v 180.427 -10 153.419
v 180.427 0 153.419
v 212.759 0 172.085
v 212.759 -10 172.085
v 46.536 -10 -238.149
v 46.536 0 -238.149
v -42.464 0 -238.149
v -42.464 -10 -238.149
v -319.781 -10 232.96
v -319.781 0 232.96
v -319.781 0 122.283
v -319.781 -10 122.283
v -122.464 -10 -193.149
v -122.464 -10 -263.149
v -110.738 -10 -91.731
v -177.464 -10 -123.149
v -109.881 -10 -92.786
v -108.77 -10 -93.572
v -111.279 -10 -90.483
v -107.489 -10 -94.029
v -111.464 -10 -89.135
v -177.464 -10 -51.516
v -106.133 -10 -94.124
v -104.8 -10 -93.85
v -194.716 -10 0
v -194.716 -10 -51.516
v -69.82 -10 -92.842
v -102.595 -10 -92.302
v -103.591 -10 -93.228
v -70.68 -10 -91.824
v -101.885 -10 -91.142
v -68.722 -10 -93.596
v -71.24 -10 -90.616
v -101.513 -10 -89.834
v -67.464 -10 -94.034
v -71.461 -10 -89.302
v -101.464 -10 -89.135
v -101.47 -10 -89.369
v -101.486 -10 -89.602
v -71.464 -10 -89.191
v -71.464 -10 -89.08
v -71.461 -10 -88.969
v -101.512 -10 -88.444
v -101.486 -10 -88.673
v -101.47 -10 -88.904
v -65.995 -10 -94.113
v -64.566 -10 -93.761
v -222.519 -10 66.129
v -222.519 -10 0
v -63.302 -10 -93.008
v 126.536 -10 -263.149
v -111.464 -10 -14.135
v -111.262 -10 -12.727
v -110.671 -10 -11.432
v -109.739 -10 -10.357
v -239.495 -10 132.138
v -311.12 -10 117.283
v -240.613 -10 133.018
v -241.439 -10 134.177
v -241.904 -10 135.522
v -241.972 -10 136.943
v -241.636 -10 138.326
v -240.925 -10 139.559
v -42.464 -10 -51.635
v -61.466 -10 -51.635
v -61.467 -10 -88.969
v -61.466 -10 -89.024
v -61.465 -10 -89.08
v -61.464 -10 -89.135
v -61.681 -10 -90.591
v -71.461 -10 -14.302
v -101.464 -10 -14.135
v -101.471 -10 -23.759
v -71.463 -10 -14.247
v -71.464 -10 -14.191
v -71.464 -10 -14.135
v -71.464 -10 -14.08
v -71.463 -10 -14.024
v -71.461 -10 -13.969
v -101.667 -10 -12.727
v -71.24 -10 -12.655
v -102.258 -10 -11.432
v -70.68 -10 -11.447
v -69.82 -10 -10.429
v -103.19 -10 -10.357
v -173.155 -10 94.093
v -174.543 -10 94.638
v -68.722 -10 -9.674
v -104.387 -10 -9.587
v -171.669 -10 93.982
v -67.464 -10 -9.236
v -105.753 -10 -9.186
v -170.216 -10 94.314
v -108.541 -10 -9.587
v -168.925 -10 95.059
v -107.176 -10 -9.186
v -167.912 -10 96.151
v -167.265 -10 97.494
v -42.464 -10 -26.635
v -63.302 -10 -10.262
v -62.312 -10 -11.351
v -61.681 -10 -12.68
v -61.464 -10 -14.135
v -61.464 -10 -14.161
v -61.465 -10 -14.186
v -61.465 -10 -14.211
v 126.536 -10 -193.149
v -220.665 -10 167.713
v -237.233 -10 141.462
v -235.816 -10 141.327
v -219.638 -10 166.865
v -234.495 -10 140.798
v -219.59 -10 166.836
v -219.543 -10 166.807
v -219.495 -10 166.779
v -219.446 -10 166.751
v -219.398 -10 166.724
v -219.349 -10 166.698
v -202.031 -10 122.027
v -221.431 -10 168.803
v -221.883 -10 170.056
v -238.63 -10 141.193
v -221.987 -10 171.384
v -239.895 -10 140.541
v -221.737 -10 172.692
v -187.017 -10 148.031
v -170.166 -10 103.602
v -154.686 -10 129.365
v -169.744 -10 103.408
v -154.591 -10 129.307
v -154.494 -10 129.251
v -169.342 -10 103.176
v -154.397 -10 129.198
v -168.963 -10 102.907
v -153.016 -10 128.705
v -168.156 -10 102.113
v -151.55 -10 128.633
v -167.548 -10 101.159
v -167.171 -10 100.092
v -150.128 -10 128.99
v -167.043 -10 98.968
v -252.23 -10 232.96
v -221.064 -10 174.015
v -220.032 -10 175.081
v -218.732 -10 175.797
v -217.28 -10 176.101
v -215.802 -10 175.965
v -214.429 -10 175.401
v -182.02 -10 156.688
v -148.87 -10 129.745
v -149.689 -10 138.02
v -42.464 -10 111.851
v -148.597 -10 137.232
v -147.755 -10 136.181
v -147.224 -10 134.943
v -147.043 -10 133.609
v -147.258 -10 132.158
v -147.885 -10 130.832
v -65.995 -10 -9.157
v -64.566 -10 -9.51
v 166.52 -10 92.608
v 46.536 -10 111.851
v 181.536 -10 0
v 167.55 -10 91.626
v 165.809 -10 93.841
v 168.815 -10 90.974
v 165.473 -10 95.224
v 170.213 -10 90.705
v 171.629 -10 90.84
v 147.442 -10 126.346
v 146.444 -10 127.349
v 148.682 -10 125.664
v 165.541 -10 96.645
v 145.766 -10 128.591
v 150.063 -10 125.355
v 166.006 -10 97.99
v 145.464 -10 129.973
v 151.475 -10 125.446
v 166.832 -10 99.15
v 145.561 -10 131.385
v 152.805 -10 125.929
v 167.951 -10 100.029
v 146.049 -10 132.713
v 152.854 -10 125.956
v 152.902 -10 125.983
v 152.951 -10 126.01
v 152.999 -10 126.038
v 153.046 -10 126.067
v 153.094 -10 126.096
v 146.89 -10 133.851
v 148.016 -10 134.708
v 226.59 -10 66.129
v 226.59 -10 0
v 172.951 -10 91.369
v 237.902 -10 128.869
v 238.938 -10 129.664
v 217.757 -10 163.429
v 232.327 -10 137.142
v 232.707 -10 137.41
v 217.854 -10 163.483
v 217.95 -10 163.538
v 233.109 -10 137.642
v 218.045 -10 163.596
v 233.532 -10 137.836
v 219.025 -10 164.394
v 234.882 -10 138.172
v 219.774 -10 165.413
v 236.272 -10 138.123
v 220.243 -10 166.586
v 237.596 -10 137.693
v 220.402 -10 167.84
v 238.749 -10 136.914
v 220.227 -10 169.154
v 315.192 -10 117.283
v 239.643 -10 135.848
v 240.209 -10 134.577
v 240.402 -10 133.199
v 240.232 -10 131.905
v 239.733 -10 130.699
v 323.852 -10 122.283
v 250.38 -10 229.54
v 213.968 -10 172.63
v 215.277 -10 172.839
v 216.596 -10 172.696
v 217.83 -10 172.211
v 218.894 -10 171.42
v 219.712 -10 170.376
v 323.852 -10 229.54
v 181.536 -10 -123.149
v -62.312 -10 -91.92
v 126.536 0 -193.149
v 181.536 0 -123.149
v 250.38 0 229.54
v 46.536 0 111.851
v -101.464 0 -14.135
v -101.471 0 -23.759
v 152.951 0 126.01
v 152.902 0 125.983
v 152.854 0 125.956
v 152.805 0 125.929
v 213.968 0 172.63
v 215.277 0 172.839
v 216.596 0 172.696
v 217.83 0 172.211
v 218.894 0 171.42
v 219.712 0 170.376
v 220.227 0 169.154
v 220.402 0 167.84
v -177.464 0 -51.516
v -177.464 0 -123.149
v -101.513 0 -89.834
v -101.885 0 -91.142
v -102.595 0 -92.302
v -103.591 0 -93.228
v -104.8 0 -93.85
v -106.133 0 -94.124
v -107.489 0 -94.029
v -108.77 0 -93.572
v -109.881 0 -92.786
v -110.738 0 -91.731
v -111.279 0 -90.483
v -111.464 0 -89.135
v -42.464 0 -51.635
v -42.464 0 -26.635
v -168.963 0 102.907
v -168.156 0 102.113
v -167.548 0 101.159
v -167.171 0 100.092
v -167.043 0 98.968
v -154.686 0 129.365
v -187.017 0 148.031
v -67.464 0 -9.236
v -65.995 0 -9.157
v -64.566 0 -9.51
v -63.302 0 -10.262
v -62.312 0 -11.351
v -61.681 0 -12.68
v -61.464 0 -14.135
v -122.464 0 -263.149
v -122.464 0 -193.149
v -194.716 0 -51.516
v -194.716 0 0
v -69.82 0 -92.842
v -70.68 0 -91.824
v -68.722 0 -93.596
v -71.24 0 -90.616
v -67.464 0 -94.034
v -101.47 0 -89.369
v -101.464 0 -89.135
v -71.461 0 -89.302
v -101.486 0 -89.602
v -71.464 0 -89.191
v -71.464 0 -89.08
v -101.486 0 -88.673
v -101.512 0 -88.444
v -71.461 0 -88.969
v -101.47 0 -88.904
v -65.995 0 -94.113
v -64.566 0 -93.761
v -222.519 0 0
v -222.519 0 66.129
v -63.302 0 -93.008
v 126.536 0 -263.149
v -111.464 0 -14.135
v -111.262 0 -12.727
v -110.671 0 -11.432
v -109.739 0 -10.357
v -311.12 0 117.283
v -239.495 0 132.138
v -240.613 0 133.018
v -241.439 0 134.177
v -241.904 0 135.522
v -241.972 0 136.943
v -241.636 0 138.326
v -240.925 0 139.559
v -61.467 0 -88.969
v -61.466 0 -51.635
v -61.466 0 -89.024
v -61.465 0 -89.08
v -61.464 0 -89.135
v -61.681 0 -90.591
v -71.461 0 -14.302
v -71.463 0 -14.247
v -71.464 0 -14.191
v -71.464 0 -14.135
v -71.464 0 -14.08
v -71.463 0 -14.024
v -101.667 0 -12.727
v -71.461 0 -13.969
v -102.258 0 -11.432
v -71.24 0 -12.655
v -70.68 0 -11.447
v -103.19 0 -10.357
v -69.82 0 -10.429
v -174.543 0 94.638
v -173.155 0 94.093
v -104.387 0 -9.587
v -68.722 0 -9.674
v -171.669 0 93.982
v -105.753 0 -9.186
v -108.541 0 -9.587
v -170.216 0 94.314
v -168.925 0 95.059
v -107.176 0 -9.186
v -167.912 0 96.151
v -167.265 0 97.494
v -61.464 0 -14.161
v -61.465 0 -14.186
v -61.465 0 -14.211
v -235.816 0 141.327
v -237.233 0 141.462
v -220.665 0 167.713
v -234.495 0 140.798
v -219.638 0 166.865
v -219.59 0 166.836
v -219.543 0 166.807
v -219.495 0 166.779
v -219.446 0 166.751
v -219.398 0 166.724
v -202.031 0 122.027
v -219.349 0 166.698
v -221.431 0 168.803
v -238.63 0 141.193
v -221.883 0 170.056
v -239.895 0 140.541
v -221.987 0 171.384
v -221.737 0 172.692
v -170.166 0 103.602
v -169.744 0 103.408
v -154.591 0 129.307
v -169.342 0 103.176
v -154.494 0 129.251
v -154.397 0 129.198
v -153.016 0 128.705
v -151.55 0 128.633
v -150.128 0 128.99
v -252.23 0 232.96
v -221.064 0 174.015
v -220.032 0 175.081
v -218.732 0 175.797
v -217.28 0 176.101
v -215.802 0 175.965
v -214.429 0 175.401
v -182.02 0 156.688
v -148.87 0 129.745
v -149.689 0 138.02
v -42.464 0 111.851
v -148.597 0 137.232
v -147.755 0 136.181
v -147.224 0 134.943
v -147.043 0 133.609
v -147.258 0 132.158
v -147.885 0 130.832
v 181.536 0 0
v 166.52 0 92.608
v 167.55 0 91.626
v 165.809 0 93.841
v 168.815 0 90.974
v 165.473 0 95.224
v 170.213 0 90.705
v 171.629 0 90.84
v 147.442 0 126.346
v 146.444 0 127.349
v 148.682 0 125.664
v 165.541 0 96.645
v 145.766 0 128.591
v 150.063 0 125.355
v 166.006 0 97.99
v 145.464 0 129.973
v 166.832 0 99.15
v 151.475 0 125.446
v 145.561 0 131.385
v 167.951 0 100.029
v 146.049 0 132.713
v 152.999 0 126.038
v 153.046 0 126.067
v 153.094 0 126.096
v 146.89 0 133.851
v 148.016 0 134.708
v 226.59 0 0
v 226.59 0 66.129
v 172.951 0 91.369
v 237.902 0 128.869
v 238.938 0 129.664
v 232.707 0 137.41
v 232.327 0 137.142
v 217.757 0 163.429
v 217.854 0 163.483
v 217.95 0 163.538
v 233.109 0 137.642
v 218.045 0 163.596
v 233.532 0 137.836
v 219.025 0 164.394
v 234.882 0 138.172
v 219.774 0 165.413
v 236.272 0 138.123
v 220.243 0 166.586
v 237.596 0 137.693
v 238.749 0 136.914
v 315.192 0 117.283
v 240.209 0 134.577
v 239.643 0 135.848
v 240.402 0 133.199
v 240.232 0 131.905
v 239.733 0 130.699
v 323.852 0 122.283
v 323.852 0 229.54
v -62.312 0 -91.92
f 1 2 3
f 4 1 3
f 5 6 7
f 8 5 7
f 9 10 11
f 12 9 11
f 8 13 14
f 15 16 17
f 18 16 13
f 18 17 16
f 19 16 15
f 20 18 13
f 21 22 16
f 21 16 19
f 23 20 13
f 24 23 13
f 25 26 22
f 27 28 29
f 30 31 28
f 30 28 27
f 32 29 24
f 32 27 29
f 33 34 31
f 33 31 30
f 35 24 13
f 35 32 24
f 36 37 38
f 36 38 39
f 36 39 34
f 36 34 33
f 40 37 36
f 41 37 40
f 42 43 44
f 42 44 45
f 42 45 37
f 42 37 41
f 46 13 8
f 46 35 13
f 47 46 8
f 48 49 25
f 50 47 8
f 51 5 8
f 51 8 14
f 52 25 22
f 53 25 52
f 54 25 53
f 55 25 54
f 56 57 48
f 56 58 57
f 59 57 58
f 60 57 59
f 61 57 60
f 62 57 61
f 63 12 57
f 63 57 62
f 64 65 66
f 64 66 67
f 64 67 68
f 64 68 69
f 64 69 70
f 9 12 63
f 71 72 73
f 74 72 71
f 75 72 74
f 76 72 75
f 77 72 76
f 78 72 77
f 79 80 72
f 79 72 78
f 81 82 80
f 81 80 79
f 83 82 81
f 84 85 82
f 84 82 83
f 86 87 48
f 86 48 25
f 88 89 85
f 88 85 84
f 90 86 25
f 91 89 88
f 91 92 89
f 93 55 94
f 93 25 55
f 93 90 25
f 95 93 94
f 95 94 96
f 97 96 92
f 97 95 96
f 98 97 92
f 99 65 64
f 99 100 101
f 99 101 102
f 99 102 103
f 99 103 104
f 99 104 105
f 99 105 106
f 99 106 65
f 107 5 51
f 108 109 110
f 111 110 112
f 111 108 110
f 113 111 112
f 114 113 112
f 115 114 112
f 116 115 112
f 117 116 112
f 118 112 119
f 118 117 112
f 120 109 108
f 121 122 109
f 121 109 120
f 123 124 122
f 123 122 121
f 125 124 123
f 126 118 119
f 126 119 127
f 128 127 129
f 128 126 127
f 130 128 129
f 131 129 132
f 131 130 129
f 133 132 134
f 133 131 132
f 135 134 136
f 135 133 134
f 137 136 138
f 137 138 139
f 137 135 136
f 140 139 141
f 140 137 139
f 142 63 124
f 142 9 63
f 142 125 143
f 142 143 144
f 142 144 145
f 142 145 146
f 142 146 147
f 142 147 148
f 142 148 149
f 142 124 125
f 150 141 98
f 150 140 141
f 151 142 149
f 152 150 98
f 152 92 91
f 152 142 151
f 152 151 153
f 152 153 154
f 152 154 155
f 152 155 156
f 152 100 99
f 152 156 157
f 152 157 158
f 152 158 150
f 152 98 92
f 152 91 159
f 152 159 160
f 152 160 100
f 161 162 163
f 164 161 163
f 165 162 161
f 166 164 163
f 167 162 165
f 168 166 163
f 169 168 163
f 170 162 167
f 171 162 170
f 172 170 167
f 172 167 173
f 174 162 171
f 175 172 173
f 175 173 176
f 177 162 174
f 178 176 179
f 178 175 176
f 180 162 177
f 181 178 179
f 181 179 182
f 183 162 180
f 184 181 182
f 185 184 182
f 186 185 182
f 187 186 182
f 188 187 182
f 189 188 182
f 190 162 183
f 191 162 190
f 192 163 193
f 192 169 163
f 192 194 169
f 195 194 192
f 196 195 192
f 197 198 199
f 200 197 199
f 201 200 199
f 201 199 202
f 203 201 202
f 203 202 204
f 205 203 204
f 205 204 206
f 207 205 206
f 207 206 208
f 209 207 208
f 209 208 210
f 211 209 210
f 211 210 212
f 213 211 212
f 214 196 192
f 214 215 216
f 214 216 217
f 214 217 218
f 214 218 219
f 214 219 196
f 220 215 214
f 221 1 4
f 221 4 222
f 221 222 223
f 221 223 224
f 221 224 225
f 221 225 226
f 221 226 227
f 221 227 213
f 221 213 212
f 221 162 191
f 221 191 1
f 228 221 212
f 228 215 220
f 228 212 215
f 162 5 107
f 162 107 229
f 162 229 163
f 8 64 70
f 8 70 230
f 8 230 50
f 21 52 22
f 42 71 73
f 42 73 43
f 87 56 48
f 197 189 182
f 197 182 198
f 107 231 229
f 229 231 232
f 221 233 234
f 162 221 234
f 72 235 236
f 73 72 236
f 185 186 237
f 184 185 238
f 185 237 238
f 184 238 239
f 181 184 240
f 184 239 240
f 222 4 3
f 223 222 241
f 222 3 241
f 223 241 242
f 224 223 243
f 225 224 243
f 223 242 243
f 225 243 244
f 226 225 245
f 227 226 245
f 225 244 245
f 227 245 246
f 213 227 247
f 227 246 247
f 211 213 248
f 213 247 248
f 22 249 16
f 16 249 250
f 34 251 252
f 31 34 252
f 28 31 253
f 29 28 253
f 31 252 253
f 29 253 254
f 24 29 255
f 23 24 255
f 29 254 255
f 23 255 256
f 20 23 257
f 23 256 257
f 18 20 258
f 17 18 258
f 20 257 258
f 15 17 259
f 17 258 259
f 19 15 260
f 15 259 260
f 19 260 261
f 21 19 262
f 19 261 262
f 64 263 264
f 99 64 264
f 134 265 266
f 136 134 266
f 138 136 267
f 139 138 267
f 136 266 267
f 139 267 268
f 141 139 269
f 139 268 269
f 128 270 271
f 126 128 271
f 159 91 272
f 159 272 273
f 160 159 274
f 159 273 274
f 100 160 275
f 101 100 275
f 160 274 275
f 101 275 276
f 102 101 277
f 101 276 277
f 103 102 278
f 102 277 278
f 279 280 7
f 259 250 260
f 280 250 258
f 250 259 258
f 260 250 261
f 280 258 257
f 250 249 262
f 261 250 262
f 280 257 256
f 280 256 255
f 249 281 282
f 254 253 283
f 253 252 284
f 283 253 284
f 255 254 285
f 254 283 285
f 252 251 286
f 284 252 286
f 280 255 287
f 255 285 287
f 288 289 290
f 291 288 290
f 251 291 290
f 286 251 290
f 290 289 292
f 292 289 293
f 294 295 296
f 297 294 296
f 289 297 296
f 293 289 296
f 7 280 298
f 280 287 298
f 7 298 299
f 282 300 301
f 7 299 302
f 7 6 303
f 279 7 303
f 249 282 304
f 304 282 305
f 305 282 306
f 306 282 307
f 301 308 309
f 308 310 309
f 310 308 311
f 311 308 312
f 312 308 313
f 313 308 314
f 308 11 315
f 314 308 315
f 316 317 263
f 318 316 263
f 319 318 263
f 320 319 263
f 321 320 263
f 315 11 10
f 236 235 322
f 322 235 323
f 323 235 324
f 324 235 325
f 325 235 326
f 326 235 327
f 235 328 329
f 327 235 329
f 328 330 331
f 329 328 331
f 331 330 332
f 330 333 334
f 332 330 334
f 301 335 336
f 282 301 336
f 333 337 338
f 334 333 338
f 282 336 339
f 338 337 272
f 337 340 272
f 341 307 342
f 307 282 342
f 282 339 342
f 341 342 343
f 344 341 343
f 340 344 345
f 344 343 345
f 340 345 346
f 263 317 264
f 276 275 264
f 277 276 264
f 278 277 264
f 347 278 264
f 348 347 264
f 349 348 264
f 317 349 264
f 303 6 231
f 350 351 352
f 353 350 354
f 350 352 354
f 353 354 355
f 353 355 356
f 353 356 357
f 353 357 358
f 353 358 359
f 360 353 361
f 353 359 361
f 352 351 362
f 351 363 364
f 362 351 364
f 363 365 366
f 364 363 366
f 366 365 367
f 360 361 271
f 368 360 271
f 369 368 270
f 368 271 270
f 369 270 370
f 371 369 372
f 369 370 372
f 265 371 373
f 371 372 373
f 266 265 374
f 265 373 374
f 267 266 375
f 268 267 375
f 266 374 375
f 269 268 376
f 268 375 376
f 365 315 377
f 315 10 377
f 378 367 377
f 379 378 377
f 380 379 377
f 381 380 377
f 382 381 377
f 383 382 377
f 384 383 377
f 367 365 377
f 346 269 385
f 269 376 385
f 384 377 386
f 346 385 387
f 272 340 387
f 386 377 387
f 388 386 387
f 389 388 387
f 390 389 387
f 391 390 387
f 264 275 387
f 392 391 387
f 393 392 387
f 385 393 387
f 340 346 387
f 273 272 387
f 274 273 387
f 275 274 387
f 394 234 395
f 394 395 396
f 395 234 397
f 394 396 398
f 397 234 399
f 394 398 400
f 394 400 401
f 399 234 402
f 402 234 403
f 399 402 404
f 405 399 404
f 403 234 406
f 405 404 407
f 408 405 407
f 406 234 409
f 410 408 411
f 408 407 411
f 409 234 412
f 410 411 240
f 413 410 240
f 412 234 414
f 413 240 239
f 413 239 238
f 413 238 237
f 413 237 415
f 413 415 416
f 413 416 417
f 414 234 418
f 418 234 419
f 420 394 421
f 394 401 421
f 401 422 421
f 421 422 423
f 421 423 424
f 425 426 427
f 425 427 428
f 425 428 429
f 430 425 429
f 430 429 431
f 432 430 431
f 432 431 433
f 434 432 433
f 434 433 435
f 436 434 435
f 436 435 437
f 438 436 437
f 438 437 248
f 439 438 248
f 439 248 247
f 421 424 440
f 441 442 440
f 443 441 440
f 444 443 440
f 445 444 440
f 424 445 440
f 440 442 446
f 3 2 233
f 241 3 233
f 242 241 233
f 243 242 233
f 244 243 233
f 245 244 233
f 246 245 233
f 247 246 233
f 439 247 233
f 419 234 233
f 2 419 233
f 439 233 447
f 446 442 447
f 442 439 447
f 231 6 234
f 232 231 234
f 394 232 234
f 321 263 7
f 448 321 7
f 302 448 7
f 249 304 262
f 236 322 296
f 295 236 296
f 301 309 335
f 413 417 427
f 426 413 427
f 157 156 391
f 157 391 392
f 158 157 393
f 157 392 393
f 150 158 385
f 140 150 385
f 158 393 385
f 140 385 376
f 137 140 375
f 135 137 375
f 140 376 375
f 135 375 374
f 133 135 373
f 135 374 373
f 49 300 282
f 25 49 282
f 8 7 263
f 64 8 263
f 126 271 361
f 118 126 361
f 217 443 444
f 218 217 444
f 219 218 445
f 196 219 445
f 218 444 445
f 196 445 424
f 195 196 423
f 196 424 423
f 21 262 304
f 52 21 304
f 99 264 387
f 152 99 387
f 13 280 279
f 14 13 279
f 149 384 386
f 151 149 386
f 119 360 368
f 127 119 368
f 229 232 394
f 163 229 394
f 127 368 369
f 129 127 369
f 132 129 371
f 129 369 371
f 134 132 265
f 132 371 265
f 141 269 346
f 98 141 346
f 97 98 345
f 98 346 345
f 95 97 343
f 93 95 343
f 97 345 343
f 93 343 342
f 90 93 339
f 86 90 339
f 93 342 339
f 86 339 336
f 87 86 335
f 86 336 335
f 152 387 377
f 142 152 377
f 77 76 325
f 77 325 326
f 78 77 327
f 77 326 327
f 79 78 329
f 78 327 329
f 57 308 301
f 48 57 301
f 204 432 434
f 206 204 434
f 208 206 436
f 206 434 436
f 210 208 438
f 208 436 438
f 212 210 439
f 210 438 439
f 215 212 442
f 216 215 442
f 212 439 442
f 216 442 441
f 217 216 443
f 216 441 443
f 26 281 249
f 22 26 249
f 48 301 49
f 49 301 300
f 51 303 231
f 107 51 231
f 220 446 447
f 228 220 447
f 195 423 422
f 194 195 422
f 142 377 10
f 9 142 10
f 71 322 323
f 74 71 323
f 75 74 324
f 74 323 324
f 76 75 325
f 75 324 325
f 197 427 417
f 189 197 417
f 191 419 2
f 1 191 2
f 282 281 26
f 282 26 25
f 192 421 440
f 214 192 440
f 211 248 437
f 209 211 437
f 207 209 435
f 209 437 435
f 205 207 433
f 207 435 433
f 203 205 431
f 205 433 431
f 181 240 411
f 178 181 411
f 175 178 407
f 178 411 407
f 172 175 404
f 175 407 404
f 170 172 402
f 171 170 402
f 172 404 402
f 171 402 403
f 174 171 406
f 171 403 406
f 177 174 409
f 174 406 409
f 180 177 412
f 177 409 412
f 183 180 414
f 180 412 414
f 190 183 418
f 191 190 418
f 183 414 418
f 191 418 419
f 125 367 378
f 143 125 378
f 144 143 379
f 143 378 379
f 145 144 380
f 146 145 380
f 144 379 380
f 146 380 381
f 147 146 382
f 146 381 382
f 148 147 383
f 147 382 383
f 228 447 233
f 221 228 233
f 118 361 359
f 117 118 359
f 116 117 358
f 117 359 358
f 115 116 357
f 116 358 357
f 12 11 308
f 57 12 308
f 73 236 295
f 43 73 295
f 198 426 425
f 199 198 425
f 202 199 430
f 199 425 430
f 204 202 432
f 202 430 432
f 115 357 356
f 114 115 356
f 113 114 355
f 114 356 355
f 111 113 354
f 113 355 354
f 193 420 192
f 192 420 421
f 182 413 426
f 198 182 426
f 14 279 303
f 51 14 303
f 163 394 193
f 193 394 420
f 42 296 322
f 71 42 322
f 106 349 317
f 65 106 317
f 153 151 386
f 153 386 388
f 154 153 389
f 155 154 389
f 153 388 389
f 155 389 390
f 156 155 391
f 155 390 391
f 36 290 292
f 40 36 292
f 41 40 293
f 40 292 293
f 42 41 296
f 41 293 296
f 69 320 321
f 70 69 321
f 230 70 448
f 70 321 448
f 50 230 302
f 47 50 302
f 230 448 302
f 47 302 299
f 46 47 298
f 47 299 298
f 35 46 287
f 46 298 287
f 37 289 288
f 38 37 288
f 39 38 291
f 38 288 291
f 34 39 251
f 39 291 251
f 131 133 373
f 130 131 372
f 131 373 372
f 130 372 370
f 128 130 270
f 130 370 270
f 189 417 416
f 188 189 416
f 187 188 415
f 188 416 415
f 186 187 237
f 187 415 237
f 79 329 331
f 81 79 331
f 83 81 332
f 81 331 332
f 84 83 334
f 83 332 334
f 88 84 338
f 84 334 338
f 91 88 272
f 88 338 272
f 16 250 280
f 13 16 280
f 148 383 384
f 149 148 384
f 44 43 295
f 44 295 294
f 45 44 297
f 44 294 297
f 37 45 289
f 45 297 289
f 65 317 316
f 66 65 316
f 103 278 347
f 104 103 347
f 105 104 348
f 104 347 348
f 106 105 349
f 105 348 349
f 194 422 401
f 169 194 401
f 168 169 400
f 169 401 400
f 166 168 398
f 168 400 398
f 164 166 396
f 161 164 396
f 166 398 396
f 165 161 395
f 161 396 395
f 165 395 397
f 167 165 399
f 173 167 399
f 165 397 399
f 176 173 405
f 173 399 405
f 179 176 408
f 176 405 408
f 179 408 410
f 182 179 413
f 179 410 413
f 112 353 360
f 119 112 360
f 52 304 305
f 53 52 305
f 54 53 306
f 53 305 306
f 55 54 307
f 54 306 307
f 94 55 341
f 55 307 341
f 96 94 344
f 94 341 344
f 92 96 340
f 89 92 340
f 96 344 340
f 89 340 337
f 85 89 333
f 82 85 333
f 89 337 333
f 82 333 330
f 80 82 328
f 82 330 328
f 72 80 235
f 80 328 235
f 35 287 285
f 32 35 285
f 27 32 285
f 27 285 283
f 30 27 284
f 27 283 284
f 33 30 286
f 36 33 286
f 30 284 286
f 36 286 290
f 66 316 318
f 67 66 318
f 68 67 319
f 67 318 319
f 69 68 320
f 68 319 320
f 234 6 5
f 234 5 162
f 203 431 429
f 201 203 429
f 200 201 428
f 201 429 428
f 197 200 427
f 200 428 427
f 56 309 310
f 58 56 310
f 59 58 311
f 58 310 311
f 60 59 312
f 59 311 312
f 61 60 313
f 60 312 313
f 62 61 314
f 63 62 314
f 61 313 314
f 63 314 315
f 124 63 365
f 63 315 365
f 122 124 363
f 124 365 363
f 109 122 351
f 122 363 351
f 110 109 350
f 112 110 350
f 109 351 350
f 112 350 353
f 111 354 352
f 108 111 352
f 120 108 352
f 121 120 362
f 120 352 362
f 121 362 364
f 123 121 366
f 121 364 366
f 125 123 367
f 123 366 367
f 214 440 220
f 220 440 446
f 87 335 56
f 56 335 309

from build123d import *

# Parameters (mm, degrees)
F0_W     = 139
F0_H     = 20
F0_W_2   = 5
F0_H_2   = 350
F0_W_3   = 17.2517846753
F0_H_3   = 51.5162105877
F1_DEPTH = 10


# Not quite as in the source:
# - ends of sketch curves that miss each other by under 0.0002 mm in the source are joined


with BuildPart() as f1:
    # F0 (on Front) → F1 (new body)
    with BuildSketch(Plane.XZ):
        with BuildLine():
            Line((-52.4642963479, 111.8511321076), (-67.4642963479, 111.8511321076))
            Line((-67.4642963479, 111.8511321076), (-67.4642963479, 97.4173753779))
            Line((-67.4642963479, 97.4173753779), (-67.4642963479, -9.2363956308))
            ThreePointArc((-67.4642963479, -9.2363956308), (-63.3020069333, -10.2623815288), (-61.4642769098, -14.1353711486))
            ThreePointArc((-61.4642769098, -14.1353711486), (-61.4644203334, -14.1732421769), (-61.4648505957, -14.2111110326))
            Line((-61.4648505957, -14.2111110326), (-61.4659559185, -51.6353711486))
            Line((-61.4659559185, -51.6353711486), (-47.4642963479, -51.6353711486))
            Line((-47.4642963479, -51.6353711486), (-47.4642963479, 111.8511321076))
            Line((-47.4642963479, 111.8511321076), (-52.4642963479, 111.8511321076))
        make_face()
        Polygon((-67.4642963479, 97.4173753779), (-67.4642963479, 111.8511321076), (-52.4642963479, 111.8511321076), (-254.7302662373, 228.6294442711), (-264.7302662373, 211.3089361954), (-179.0455194088, 161.8388245486), align=None)
        with BuildLine():
            Line((-67.4642963479, -9.2363956308), (-67.4642963479, 97.4173753779))
            Line((-67.4642963479, 97.4173753779), (-179.0455194088, 161.8388245486))
            Line((-179.0455194088, 161.8388245486), (-182.0195368853, 156.6876751766))
            Line((-182.0195368853, 156.6876751766), (-149.6885534271, 138.0200999612))
            ThreePointArc((-149.6885534271, 138.0200999612), (-147.754915652, 136.1808734705), (-147.0427447391, 133.6090022218))
            ThreePointArc((-147.0427447391, 133.6090022218), (-149.4708734904, 129.3211731347), (-154.3969360511, 129.1979044824))
            ThreePointArc((-154.3969360511, 129.1979044824), (-154.5427447391, 129.2788752028), (-154.685771784, 129.3646638705))
            Line((-154.685771784, 129.3646638705), (-187.0173065595, 148.0312841764))
            Line((-187.0173065595, 148.0312841764), (-202.0308315575, 122.0270960791))
            Line((-202.0308315575, 122.0270960791), (-170.1659063917, 103.6023660524))
            ThreePointArc((-170.1659063917, 103.6023660524), (-169.5399428743, 103.2964942228), (-168.9625725467, 102.9065821737))
            ThreePointArc((-168.9625725467, 102.9065821737), (-167.5482558381, 101.1587780548), (-167.0427447391, 98.9679860704))
            ThreePointArc((-167.0427447391, 98.9679860704), (-169.5427447391, 94.6378590515), (-174.5427447391, 94.6378590515))
            Line((-174.5427447391, 94.6378590515), (-207.018697381, 113.3878590515))
            Line((-207.018697381, 113.3878590515), (-222.518697381, 86.5410715342))
            Line((-222.518697381, 86.5410715342), (-222.518697381, 66.1286172816))
            Line((-222.518697381, 66.1286172816), (-222.518697381, 46.1286172816))
            Line((-222.518697381, 46.1286172816), (-177.4642963479, 20.116446717))
            Line((-177.4642963479, 20.116446717), (-111.4642769098, -17.9886822721))
            Line((-111.4642769098, -17.9886822721), (-111.4642769098, -14.1353711486))
            ThreePointArc((-111.4642769098, -14.1353711486), (-106.4642769098, -9.1353711486), (-101.4642769098, -14.1353711486))
            Line((-101.4642769098, -14.1353711486), (-71.4642769098, -14.1353711486))
            ThreePointArc((-71.4642769098, -14.1353711486), (-71.4635814507, -14.0519798555), (-71.4614952667, -13.9686117605))
            ThreePointArc((-71.4614952667, -13.9686117605), (-70.283986672, -10.9089462954), (-67.4642963479, -9.2363956308))
        make_face()
        Polygon((-254.7302662373, 228.6294442711), (-52.4642963479, 111.8511321076), (-47.4642963479, 111.8511321076), (-42.4642963479, 111.8511321076), (-252.2302662373, 232.95957129), align=None)
        with BuildLine():
            Line((-182.0195368853, 156.6876751766), (-179.0455194088, 161.8388245486))
            Line((-179.0455194088, 161.8388245486), (-264.7302662373, 211.3089361954))
            Line((-264.7302662373, 211.3089361954), (-302.2302662373, 232.95957129))
            Line((-302.2302662373, 232.95957129), (-319.7805383214, 232.95957129))
            Line((-319.7805383214, 232.95957129), (-319.7805383214, 122.2827673304))
            Line((-319.7805383214, 122.2827673304), (-311.1202842835, 117.2827673304))
            Line((-311.1202842835, 117.2827673304), (-222.518697381, 66.1286172816))
            Line((-222.518697381, 66.1286172816), (-222.518697381, 86.5410715342))
            Line((-222.518697381, 86.5410715342), (-207.018697381, 113.3878590515))
            Line((-207.018697381, 113.3878590515), (-239.4946500229, 132.1378590515))
            ThreePointArc((-239.4946500229, 132.1378590515), (-241.3247770419, 138.9679860704), (-234.4946500229, 140.7981130893))
            Line((-234.4946500229, 140.7981130893), (-219.4946500229, 166.7788752029))
            ThreePointArc((-219.4946500229, 166.7788752029), (-219.5665212716, 166.8211731347), (-219.6376770678, 166.8646638705))
            ThreePointArc((-219.6376770678, 166.8646638705), (-221.6986741524, 169.4142582916), (-221.7372907101, 172.6924665608))
            ThreePointArc((-221.7372907101, 172.6924665608), (-218.7321520995, 175.7974013658), (-214.4293442023, 175.4007624721))
            Line((-214.4293442023, 175.4007624721), (-182.0195368853, 156.6876751766))
        make_face()
        Polygon((-42.4642963479, 111.8511321076), (-47.4642963479, 111.8511321076), (-47.4642963479, -51.6353711486), (-42.4642769098, -51.6353711486), (-42.4642963479, -26.6353711486), align=None)
        Polygon((-264.7302662373, 211.3089361954), (-254.7302662373, 228.6294442711), (-262.2302662373, 232.95957129), (-302.2302662373, 232.95957129), align=None)
        Polygon((-262.2302662373, 232.95957129), (-254.7302662373, 228.6294442711), (-252.2302662373, 232.95957129), align=None)
        Polygon((-42.4642769098, -51.6353711486), (-47.4642963479, -51.6353711486), (-47.4642963479, -238.1488678924), (-42.4642963479, -238.1488678924), align=None)
        with BuildLine():
            Line((-47.4642963479, -238.1488678924), (-47.4642963479, -51.6353711486))
            Line((-47.4642963479, -51.6353711486), (-61.4659559185, -51.6353711486))
            Line((-61.4659559185, -51.6353711486), (-61.4670585529, -88.9686117605))
            ThreePointArc((-61.4670585529, -88.9686117605), (-61.464972369, -89.0519798555), (-61.4642769098, -89.1353711486))
            ThreePointArc((-61.4642769098, -89.1353711486), (-63.3020069333, -93.0083607684), (-67.4642963479, -94.0343466663))
            Line((-67.4642963479, -94.0343466663), (-67.4642963479, -98.048845338))
            Line((-67.4642963479, -98.048845338), (-67.4642963479, -123.1488678924))
            Line((-67.4642963479, -123.1488678924), (-67.4642963479, -238.1488678924))
            Line((-67.4642963479, -238.1488678924), (-47.4642963479, -238.1488678924))
        make_face()
        with BuildLine():
            ThreePointArc((-71.4614952667, -14.3021305367), (-71.4635814507, -14.2187624417), (-71.4642769098, -14.1353711486))
            Line((-71.4642769098, -14.1353711486), (-101.4642762117, -14.1353711486))
            Line((-101.4642762117, -14.1353711486), (-101.4705038559, -23.758589835))
            Line((-101.4705038559, -23.758589835), (-71.4614952667, -41.0842990221))
            Line((-71.4614952667, -41.0842990221), (-71.4614952667, -14.3021305367))
        make_face()
        Polygon((-42.4642963479, -238.1488678924), (-47.4642963479, -238.1488678924), (-67.4642963479, -238.1488678924), (-67.4642963479, -243.1488678924), (71.5357036521, -243.1488678924), (71.5357036521, -238.1488678924), (51.5357036521, -238.1488678924), (46.5357036521, -238.1488678924), align=None)
        Polygon((-67.4642963479, -243.1488678924), (-67.4642963479, -238.1488678924), (-67.4642963479, -123.1488678924), (-177.4642963479, -123.1488678924), (-122.4642963479, -193.1488678924), (-67.4642963479, -263.1488678924), align=None)
        with BuildLine():
            Line((-71.4614952667, -88.9686117605), (-71.4614952667, -41.0842990221))
            Line((-71.4614952667, -41.0842990221), (-101.4705038559, -23.758589835))
            Line((-101.4705038559, -23.758589835), (-101.5123669409, -88.4435708452))
            ThreePointArc((-101.5123669409, -88.4435708452), (-101.4763139065, -88.7886362676), (-101.4642769098, -89.1353711486))
            ThreePointArc((-101.4642769098, -89.1353711486), (-101.4765393523, -89.4853340862), (-101.5132665329, -89.8335804636))
            ThreePointArc((-101.5132665329, -89.8335804636), (-106.8142398474, -94.1231087061), (-111.4642769098, -89.1353711486))
            Line((-111.4642769098, -89.1353711486), (-111.4642769098, -17.9886822721))
            Line((-111.4642769098, -17.9886822721), (-177.4642963479, 20.116446717))
            Line((-177.4642963479, 20.116446717), (-177.4642963479, 0))
            Line((-177.4642963479, 0), (-177.4642963479, -51.5162105877))
            Line((-177.4642963479, -51.5162105877), (-177.4642963479, -123.1488678924))
            Line((-177.4642963479, -123.1488678924), (-67.4642963479, -123.1488678924))
            Line((-67.4642963479, -123.1488678924), (-67.4642963479, -98.048845338))
            Line((-67.4642963479, -98.048845338), (-67.4642963479, -94.0343466663))
            ThreePointArc((-67.4642963479, -94.0343466663), (-70.283986672, -92.3617960018), (-71.4614952667, -89.3021305367))
            ThreePointArc((-71.4614952667, -89.3021305367), (-71.4642769098, -89.1353711486), (-71.4614952667, -88.9686117605))
        make_face()
        with BuildLine():
            Line((-202.0308315575, 122.0270960791), (-187.0173065595, 148.0312841764))
            Line((-187.0173065595, 148.0312841764), (-219.348841335, 166.6979044824))
            ThreePointArc((-219.348841335, 166.6979044824), (-219.4220833151, 166.7377818416), (-219.4946500229, 166.7788752029))
            Line((-219.4946500229, 166.7788752029), (-234.4946494994, 140.7981139961))
            Line((-234.4946494994, 140.7981139961), (-202.0308315575, 122.0270960791))
        make_face()
        with Locations((2.0357036521, -253.1488678924)):
            Rectangle(F0_W, F0_H)
        with Locations((49.0357036521, -63.1488678924)):
            Rectangle(F0_W_2, F0_H_2)
        Polygon((-122.4642963479, -263.1488678924), (-67.4642963479, -263.1488678924), (-122.4642963479, -193.1488678924), align=None)
        Polygon((71.5357036521, -238.1488678924), (71.5357036521, -243.1488678924), (71.5357036521, -263.1488678924), (126.5357036521, -193.1488678924), (181.5357036521, -123.1488678924), (71.5357036521, -123.1488678924), align=None)
        Polygon((51.5357036521, 111.8511321076), (51.5357036521, -238.1488678924), (71.5357036521, -238.1488678924), (71.5357036521, -123.1488678924), (71.5357036521, -43.3920828938), (71.5357036521, 97.4173753779), (71.5357036521, 111.8511321076), (56.5357036521, 111.8511321076), align=None)
        Polygon((250.3796616473, 229.5404961288), (46.5357036521, 111.8511321076), (51.5357036521, 111.8511321076), (56.5357036521, 111.8511321076), (252.8796616473, 225.2103691099), align=None)
        Polygon((-177.4642963479, 0), (-177.4642963479, 20.116446717), (-222.518697381, 46.1286172816), (-222.518697381, 0), (-194.7160810232, 0), align=None)
        with Locations((-186.0901886856, -25.7581052938)):
            Rectangle(F0_W_3, F0_H_3)
        Polygon((126.5357036521, -193.1488678924), (71.5357036521, -263.1488678924), (126.5357036521, -263.1488678924), align=None)
        Polygon((260.3796616473, 229.5404961288), (250.3796616473, 229.5404961288), (252.8796616473, 225.2103691099), align=None)
        Polygon((71.5357036521, -43.3920828938), (71.5357036521, -123.1488678924), (181.5357036521, -123.1488678924), (181.5357036521, 0), (181.5357036521, 20.116446717), align=None)
        Polygon((252.8796616473, 225.2103691099), (56.5357036521, 111.8511321076), (71.5357036521, 111.8511321076), (71.5357036521, 97.4173753779), (177.45381959, 158.5692281267), (262.8796616473, 207.8898610342), align=None)
        Polygon((260.3796616473, 229.5404961288), (252.8796616473, 225.2103691099), (262.8796616473, 207.8898610342), (300.3796616473, 229.5404961288), align=None)
        Polygon((71.5357036521, 97.4173753779), (71.5357036521, -43.3920828938), (181.5357036521, 20.116446717), (226.5901036521, 46.1286166852), (226.5901036521, 66.1286166852), (315.1916915876, 117.2827673304), (262.8796616473, 207.8898610342), (177.45381959, 158.5692281267), align=None)
        with BuildLine():
            ThreePointArc((172.950565815, 91.3690924644), (166.120438796, 93.1992194834), (167.950565815, 100.0293465023))
            Line((167.950565815, 100.0293465023), (232.3273994773, 137.141799162))
            ThreePointArc((232.3273994773, 137.141799162), (232.9052740107, 137.5309635551), (233.5316329143, 137.8360249017))
            ThreePointArc((233.5316329143, 137.8360249017), (238.1994166719, 137.3437454468), (240.4024710988, 133.1992194834))
            ThreePointArc((240.4024710988, 133.1992194834), (239.7325981177, 130.6992194834), (237.9024710988, 128.8690924644))
            Line((237.9024710988, 128.8690924644), (172.950565815, 91.3690924644))
        make_face(mode=Mode.SUBTRACT)
        with BuildLine():
            Line((148.0164453216, 134.7077357691), (180.4273579612, 153.4189085895))
            Line((180.4273579612, 153.4189085895), (212.7594440539, 172.084573986))
            ThreePointArc((212.7594440539, 172.084573986), (217.829904391, 172.2114560149), (220.4024710988, 167.8402356347))
            ThreePointArc((220.4024710988, 167.8402356347), (219.773691479, 165.4128023426), (218.0454981437, 163.5958972835))
            ThreePointArc((218.0454981437, 163.5958972835), (217.9024710988, 163.5101086158), (217.7566624108, 163.4291378954))
            Line((217.7566624108, 163.4291378954), (153.0935928598, 126.0958972835))
            ThreePointArc((153.0935928598, 126.0958972835), (153.0224370637, 126.0524065477), (152.950565815, 126.0101086158))
            ThreePointArc((152.950565815, 126.0101086158), (152.8779991071, 125.9690152546), (152.804757127, 125.9291378954))
            ThreePointArc((152.804757127, 125.9291378954), (146.061084943, 127.945980495), (148.0164453216, 134.7077357691))
        make_face(mode=Mode.SUBTRACT)
        Polygon((300.3796616473, 229.5404961288), (262.8796616473, 207.8898610342), (315.1916915876, 117.2827673304), (323.8519456255, 122.2827673304), (323.8519456255, 229.5404961288), align=None)
        Polygon((181.5357036521, 20.116446717), (181.5357036521, 0), (226.5901036521, 0), (226.5901036521, 46.1286166852), align=None)
    extrude(amount=F1_DEPTH)


solid = f1.part
